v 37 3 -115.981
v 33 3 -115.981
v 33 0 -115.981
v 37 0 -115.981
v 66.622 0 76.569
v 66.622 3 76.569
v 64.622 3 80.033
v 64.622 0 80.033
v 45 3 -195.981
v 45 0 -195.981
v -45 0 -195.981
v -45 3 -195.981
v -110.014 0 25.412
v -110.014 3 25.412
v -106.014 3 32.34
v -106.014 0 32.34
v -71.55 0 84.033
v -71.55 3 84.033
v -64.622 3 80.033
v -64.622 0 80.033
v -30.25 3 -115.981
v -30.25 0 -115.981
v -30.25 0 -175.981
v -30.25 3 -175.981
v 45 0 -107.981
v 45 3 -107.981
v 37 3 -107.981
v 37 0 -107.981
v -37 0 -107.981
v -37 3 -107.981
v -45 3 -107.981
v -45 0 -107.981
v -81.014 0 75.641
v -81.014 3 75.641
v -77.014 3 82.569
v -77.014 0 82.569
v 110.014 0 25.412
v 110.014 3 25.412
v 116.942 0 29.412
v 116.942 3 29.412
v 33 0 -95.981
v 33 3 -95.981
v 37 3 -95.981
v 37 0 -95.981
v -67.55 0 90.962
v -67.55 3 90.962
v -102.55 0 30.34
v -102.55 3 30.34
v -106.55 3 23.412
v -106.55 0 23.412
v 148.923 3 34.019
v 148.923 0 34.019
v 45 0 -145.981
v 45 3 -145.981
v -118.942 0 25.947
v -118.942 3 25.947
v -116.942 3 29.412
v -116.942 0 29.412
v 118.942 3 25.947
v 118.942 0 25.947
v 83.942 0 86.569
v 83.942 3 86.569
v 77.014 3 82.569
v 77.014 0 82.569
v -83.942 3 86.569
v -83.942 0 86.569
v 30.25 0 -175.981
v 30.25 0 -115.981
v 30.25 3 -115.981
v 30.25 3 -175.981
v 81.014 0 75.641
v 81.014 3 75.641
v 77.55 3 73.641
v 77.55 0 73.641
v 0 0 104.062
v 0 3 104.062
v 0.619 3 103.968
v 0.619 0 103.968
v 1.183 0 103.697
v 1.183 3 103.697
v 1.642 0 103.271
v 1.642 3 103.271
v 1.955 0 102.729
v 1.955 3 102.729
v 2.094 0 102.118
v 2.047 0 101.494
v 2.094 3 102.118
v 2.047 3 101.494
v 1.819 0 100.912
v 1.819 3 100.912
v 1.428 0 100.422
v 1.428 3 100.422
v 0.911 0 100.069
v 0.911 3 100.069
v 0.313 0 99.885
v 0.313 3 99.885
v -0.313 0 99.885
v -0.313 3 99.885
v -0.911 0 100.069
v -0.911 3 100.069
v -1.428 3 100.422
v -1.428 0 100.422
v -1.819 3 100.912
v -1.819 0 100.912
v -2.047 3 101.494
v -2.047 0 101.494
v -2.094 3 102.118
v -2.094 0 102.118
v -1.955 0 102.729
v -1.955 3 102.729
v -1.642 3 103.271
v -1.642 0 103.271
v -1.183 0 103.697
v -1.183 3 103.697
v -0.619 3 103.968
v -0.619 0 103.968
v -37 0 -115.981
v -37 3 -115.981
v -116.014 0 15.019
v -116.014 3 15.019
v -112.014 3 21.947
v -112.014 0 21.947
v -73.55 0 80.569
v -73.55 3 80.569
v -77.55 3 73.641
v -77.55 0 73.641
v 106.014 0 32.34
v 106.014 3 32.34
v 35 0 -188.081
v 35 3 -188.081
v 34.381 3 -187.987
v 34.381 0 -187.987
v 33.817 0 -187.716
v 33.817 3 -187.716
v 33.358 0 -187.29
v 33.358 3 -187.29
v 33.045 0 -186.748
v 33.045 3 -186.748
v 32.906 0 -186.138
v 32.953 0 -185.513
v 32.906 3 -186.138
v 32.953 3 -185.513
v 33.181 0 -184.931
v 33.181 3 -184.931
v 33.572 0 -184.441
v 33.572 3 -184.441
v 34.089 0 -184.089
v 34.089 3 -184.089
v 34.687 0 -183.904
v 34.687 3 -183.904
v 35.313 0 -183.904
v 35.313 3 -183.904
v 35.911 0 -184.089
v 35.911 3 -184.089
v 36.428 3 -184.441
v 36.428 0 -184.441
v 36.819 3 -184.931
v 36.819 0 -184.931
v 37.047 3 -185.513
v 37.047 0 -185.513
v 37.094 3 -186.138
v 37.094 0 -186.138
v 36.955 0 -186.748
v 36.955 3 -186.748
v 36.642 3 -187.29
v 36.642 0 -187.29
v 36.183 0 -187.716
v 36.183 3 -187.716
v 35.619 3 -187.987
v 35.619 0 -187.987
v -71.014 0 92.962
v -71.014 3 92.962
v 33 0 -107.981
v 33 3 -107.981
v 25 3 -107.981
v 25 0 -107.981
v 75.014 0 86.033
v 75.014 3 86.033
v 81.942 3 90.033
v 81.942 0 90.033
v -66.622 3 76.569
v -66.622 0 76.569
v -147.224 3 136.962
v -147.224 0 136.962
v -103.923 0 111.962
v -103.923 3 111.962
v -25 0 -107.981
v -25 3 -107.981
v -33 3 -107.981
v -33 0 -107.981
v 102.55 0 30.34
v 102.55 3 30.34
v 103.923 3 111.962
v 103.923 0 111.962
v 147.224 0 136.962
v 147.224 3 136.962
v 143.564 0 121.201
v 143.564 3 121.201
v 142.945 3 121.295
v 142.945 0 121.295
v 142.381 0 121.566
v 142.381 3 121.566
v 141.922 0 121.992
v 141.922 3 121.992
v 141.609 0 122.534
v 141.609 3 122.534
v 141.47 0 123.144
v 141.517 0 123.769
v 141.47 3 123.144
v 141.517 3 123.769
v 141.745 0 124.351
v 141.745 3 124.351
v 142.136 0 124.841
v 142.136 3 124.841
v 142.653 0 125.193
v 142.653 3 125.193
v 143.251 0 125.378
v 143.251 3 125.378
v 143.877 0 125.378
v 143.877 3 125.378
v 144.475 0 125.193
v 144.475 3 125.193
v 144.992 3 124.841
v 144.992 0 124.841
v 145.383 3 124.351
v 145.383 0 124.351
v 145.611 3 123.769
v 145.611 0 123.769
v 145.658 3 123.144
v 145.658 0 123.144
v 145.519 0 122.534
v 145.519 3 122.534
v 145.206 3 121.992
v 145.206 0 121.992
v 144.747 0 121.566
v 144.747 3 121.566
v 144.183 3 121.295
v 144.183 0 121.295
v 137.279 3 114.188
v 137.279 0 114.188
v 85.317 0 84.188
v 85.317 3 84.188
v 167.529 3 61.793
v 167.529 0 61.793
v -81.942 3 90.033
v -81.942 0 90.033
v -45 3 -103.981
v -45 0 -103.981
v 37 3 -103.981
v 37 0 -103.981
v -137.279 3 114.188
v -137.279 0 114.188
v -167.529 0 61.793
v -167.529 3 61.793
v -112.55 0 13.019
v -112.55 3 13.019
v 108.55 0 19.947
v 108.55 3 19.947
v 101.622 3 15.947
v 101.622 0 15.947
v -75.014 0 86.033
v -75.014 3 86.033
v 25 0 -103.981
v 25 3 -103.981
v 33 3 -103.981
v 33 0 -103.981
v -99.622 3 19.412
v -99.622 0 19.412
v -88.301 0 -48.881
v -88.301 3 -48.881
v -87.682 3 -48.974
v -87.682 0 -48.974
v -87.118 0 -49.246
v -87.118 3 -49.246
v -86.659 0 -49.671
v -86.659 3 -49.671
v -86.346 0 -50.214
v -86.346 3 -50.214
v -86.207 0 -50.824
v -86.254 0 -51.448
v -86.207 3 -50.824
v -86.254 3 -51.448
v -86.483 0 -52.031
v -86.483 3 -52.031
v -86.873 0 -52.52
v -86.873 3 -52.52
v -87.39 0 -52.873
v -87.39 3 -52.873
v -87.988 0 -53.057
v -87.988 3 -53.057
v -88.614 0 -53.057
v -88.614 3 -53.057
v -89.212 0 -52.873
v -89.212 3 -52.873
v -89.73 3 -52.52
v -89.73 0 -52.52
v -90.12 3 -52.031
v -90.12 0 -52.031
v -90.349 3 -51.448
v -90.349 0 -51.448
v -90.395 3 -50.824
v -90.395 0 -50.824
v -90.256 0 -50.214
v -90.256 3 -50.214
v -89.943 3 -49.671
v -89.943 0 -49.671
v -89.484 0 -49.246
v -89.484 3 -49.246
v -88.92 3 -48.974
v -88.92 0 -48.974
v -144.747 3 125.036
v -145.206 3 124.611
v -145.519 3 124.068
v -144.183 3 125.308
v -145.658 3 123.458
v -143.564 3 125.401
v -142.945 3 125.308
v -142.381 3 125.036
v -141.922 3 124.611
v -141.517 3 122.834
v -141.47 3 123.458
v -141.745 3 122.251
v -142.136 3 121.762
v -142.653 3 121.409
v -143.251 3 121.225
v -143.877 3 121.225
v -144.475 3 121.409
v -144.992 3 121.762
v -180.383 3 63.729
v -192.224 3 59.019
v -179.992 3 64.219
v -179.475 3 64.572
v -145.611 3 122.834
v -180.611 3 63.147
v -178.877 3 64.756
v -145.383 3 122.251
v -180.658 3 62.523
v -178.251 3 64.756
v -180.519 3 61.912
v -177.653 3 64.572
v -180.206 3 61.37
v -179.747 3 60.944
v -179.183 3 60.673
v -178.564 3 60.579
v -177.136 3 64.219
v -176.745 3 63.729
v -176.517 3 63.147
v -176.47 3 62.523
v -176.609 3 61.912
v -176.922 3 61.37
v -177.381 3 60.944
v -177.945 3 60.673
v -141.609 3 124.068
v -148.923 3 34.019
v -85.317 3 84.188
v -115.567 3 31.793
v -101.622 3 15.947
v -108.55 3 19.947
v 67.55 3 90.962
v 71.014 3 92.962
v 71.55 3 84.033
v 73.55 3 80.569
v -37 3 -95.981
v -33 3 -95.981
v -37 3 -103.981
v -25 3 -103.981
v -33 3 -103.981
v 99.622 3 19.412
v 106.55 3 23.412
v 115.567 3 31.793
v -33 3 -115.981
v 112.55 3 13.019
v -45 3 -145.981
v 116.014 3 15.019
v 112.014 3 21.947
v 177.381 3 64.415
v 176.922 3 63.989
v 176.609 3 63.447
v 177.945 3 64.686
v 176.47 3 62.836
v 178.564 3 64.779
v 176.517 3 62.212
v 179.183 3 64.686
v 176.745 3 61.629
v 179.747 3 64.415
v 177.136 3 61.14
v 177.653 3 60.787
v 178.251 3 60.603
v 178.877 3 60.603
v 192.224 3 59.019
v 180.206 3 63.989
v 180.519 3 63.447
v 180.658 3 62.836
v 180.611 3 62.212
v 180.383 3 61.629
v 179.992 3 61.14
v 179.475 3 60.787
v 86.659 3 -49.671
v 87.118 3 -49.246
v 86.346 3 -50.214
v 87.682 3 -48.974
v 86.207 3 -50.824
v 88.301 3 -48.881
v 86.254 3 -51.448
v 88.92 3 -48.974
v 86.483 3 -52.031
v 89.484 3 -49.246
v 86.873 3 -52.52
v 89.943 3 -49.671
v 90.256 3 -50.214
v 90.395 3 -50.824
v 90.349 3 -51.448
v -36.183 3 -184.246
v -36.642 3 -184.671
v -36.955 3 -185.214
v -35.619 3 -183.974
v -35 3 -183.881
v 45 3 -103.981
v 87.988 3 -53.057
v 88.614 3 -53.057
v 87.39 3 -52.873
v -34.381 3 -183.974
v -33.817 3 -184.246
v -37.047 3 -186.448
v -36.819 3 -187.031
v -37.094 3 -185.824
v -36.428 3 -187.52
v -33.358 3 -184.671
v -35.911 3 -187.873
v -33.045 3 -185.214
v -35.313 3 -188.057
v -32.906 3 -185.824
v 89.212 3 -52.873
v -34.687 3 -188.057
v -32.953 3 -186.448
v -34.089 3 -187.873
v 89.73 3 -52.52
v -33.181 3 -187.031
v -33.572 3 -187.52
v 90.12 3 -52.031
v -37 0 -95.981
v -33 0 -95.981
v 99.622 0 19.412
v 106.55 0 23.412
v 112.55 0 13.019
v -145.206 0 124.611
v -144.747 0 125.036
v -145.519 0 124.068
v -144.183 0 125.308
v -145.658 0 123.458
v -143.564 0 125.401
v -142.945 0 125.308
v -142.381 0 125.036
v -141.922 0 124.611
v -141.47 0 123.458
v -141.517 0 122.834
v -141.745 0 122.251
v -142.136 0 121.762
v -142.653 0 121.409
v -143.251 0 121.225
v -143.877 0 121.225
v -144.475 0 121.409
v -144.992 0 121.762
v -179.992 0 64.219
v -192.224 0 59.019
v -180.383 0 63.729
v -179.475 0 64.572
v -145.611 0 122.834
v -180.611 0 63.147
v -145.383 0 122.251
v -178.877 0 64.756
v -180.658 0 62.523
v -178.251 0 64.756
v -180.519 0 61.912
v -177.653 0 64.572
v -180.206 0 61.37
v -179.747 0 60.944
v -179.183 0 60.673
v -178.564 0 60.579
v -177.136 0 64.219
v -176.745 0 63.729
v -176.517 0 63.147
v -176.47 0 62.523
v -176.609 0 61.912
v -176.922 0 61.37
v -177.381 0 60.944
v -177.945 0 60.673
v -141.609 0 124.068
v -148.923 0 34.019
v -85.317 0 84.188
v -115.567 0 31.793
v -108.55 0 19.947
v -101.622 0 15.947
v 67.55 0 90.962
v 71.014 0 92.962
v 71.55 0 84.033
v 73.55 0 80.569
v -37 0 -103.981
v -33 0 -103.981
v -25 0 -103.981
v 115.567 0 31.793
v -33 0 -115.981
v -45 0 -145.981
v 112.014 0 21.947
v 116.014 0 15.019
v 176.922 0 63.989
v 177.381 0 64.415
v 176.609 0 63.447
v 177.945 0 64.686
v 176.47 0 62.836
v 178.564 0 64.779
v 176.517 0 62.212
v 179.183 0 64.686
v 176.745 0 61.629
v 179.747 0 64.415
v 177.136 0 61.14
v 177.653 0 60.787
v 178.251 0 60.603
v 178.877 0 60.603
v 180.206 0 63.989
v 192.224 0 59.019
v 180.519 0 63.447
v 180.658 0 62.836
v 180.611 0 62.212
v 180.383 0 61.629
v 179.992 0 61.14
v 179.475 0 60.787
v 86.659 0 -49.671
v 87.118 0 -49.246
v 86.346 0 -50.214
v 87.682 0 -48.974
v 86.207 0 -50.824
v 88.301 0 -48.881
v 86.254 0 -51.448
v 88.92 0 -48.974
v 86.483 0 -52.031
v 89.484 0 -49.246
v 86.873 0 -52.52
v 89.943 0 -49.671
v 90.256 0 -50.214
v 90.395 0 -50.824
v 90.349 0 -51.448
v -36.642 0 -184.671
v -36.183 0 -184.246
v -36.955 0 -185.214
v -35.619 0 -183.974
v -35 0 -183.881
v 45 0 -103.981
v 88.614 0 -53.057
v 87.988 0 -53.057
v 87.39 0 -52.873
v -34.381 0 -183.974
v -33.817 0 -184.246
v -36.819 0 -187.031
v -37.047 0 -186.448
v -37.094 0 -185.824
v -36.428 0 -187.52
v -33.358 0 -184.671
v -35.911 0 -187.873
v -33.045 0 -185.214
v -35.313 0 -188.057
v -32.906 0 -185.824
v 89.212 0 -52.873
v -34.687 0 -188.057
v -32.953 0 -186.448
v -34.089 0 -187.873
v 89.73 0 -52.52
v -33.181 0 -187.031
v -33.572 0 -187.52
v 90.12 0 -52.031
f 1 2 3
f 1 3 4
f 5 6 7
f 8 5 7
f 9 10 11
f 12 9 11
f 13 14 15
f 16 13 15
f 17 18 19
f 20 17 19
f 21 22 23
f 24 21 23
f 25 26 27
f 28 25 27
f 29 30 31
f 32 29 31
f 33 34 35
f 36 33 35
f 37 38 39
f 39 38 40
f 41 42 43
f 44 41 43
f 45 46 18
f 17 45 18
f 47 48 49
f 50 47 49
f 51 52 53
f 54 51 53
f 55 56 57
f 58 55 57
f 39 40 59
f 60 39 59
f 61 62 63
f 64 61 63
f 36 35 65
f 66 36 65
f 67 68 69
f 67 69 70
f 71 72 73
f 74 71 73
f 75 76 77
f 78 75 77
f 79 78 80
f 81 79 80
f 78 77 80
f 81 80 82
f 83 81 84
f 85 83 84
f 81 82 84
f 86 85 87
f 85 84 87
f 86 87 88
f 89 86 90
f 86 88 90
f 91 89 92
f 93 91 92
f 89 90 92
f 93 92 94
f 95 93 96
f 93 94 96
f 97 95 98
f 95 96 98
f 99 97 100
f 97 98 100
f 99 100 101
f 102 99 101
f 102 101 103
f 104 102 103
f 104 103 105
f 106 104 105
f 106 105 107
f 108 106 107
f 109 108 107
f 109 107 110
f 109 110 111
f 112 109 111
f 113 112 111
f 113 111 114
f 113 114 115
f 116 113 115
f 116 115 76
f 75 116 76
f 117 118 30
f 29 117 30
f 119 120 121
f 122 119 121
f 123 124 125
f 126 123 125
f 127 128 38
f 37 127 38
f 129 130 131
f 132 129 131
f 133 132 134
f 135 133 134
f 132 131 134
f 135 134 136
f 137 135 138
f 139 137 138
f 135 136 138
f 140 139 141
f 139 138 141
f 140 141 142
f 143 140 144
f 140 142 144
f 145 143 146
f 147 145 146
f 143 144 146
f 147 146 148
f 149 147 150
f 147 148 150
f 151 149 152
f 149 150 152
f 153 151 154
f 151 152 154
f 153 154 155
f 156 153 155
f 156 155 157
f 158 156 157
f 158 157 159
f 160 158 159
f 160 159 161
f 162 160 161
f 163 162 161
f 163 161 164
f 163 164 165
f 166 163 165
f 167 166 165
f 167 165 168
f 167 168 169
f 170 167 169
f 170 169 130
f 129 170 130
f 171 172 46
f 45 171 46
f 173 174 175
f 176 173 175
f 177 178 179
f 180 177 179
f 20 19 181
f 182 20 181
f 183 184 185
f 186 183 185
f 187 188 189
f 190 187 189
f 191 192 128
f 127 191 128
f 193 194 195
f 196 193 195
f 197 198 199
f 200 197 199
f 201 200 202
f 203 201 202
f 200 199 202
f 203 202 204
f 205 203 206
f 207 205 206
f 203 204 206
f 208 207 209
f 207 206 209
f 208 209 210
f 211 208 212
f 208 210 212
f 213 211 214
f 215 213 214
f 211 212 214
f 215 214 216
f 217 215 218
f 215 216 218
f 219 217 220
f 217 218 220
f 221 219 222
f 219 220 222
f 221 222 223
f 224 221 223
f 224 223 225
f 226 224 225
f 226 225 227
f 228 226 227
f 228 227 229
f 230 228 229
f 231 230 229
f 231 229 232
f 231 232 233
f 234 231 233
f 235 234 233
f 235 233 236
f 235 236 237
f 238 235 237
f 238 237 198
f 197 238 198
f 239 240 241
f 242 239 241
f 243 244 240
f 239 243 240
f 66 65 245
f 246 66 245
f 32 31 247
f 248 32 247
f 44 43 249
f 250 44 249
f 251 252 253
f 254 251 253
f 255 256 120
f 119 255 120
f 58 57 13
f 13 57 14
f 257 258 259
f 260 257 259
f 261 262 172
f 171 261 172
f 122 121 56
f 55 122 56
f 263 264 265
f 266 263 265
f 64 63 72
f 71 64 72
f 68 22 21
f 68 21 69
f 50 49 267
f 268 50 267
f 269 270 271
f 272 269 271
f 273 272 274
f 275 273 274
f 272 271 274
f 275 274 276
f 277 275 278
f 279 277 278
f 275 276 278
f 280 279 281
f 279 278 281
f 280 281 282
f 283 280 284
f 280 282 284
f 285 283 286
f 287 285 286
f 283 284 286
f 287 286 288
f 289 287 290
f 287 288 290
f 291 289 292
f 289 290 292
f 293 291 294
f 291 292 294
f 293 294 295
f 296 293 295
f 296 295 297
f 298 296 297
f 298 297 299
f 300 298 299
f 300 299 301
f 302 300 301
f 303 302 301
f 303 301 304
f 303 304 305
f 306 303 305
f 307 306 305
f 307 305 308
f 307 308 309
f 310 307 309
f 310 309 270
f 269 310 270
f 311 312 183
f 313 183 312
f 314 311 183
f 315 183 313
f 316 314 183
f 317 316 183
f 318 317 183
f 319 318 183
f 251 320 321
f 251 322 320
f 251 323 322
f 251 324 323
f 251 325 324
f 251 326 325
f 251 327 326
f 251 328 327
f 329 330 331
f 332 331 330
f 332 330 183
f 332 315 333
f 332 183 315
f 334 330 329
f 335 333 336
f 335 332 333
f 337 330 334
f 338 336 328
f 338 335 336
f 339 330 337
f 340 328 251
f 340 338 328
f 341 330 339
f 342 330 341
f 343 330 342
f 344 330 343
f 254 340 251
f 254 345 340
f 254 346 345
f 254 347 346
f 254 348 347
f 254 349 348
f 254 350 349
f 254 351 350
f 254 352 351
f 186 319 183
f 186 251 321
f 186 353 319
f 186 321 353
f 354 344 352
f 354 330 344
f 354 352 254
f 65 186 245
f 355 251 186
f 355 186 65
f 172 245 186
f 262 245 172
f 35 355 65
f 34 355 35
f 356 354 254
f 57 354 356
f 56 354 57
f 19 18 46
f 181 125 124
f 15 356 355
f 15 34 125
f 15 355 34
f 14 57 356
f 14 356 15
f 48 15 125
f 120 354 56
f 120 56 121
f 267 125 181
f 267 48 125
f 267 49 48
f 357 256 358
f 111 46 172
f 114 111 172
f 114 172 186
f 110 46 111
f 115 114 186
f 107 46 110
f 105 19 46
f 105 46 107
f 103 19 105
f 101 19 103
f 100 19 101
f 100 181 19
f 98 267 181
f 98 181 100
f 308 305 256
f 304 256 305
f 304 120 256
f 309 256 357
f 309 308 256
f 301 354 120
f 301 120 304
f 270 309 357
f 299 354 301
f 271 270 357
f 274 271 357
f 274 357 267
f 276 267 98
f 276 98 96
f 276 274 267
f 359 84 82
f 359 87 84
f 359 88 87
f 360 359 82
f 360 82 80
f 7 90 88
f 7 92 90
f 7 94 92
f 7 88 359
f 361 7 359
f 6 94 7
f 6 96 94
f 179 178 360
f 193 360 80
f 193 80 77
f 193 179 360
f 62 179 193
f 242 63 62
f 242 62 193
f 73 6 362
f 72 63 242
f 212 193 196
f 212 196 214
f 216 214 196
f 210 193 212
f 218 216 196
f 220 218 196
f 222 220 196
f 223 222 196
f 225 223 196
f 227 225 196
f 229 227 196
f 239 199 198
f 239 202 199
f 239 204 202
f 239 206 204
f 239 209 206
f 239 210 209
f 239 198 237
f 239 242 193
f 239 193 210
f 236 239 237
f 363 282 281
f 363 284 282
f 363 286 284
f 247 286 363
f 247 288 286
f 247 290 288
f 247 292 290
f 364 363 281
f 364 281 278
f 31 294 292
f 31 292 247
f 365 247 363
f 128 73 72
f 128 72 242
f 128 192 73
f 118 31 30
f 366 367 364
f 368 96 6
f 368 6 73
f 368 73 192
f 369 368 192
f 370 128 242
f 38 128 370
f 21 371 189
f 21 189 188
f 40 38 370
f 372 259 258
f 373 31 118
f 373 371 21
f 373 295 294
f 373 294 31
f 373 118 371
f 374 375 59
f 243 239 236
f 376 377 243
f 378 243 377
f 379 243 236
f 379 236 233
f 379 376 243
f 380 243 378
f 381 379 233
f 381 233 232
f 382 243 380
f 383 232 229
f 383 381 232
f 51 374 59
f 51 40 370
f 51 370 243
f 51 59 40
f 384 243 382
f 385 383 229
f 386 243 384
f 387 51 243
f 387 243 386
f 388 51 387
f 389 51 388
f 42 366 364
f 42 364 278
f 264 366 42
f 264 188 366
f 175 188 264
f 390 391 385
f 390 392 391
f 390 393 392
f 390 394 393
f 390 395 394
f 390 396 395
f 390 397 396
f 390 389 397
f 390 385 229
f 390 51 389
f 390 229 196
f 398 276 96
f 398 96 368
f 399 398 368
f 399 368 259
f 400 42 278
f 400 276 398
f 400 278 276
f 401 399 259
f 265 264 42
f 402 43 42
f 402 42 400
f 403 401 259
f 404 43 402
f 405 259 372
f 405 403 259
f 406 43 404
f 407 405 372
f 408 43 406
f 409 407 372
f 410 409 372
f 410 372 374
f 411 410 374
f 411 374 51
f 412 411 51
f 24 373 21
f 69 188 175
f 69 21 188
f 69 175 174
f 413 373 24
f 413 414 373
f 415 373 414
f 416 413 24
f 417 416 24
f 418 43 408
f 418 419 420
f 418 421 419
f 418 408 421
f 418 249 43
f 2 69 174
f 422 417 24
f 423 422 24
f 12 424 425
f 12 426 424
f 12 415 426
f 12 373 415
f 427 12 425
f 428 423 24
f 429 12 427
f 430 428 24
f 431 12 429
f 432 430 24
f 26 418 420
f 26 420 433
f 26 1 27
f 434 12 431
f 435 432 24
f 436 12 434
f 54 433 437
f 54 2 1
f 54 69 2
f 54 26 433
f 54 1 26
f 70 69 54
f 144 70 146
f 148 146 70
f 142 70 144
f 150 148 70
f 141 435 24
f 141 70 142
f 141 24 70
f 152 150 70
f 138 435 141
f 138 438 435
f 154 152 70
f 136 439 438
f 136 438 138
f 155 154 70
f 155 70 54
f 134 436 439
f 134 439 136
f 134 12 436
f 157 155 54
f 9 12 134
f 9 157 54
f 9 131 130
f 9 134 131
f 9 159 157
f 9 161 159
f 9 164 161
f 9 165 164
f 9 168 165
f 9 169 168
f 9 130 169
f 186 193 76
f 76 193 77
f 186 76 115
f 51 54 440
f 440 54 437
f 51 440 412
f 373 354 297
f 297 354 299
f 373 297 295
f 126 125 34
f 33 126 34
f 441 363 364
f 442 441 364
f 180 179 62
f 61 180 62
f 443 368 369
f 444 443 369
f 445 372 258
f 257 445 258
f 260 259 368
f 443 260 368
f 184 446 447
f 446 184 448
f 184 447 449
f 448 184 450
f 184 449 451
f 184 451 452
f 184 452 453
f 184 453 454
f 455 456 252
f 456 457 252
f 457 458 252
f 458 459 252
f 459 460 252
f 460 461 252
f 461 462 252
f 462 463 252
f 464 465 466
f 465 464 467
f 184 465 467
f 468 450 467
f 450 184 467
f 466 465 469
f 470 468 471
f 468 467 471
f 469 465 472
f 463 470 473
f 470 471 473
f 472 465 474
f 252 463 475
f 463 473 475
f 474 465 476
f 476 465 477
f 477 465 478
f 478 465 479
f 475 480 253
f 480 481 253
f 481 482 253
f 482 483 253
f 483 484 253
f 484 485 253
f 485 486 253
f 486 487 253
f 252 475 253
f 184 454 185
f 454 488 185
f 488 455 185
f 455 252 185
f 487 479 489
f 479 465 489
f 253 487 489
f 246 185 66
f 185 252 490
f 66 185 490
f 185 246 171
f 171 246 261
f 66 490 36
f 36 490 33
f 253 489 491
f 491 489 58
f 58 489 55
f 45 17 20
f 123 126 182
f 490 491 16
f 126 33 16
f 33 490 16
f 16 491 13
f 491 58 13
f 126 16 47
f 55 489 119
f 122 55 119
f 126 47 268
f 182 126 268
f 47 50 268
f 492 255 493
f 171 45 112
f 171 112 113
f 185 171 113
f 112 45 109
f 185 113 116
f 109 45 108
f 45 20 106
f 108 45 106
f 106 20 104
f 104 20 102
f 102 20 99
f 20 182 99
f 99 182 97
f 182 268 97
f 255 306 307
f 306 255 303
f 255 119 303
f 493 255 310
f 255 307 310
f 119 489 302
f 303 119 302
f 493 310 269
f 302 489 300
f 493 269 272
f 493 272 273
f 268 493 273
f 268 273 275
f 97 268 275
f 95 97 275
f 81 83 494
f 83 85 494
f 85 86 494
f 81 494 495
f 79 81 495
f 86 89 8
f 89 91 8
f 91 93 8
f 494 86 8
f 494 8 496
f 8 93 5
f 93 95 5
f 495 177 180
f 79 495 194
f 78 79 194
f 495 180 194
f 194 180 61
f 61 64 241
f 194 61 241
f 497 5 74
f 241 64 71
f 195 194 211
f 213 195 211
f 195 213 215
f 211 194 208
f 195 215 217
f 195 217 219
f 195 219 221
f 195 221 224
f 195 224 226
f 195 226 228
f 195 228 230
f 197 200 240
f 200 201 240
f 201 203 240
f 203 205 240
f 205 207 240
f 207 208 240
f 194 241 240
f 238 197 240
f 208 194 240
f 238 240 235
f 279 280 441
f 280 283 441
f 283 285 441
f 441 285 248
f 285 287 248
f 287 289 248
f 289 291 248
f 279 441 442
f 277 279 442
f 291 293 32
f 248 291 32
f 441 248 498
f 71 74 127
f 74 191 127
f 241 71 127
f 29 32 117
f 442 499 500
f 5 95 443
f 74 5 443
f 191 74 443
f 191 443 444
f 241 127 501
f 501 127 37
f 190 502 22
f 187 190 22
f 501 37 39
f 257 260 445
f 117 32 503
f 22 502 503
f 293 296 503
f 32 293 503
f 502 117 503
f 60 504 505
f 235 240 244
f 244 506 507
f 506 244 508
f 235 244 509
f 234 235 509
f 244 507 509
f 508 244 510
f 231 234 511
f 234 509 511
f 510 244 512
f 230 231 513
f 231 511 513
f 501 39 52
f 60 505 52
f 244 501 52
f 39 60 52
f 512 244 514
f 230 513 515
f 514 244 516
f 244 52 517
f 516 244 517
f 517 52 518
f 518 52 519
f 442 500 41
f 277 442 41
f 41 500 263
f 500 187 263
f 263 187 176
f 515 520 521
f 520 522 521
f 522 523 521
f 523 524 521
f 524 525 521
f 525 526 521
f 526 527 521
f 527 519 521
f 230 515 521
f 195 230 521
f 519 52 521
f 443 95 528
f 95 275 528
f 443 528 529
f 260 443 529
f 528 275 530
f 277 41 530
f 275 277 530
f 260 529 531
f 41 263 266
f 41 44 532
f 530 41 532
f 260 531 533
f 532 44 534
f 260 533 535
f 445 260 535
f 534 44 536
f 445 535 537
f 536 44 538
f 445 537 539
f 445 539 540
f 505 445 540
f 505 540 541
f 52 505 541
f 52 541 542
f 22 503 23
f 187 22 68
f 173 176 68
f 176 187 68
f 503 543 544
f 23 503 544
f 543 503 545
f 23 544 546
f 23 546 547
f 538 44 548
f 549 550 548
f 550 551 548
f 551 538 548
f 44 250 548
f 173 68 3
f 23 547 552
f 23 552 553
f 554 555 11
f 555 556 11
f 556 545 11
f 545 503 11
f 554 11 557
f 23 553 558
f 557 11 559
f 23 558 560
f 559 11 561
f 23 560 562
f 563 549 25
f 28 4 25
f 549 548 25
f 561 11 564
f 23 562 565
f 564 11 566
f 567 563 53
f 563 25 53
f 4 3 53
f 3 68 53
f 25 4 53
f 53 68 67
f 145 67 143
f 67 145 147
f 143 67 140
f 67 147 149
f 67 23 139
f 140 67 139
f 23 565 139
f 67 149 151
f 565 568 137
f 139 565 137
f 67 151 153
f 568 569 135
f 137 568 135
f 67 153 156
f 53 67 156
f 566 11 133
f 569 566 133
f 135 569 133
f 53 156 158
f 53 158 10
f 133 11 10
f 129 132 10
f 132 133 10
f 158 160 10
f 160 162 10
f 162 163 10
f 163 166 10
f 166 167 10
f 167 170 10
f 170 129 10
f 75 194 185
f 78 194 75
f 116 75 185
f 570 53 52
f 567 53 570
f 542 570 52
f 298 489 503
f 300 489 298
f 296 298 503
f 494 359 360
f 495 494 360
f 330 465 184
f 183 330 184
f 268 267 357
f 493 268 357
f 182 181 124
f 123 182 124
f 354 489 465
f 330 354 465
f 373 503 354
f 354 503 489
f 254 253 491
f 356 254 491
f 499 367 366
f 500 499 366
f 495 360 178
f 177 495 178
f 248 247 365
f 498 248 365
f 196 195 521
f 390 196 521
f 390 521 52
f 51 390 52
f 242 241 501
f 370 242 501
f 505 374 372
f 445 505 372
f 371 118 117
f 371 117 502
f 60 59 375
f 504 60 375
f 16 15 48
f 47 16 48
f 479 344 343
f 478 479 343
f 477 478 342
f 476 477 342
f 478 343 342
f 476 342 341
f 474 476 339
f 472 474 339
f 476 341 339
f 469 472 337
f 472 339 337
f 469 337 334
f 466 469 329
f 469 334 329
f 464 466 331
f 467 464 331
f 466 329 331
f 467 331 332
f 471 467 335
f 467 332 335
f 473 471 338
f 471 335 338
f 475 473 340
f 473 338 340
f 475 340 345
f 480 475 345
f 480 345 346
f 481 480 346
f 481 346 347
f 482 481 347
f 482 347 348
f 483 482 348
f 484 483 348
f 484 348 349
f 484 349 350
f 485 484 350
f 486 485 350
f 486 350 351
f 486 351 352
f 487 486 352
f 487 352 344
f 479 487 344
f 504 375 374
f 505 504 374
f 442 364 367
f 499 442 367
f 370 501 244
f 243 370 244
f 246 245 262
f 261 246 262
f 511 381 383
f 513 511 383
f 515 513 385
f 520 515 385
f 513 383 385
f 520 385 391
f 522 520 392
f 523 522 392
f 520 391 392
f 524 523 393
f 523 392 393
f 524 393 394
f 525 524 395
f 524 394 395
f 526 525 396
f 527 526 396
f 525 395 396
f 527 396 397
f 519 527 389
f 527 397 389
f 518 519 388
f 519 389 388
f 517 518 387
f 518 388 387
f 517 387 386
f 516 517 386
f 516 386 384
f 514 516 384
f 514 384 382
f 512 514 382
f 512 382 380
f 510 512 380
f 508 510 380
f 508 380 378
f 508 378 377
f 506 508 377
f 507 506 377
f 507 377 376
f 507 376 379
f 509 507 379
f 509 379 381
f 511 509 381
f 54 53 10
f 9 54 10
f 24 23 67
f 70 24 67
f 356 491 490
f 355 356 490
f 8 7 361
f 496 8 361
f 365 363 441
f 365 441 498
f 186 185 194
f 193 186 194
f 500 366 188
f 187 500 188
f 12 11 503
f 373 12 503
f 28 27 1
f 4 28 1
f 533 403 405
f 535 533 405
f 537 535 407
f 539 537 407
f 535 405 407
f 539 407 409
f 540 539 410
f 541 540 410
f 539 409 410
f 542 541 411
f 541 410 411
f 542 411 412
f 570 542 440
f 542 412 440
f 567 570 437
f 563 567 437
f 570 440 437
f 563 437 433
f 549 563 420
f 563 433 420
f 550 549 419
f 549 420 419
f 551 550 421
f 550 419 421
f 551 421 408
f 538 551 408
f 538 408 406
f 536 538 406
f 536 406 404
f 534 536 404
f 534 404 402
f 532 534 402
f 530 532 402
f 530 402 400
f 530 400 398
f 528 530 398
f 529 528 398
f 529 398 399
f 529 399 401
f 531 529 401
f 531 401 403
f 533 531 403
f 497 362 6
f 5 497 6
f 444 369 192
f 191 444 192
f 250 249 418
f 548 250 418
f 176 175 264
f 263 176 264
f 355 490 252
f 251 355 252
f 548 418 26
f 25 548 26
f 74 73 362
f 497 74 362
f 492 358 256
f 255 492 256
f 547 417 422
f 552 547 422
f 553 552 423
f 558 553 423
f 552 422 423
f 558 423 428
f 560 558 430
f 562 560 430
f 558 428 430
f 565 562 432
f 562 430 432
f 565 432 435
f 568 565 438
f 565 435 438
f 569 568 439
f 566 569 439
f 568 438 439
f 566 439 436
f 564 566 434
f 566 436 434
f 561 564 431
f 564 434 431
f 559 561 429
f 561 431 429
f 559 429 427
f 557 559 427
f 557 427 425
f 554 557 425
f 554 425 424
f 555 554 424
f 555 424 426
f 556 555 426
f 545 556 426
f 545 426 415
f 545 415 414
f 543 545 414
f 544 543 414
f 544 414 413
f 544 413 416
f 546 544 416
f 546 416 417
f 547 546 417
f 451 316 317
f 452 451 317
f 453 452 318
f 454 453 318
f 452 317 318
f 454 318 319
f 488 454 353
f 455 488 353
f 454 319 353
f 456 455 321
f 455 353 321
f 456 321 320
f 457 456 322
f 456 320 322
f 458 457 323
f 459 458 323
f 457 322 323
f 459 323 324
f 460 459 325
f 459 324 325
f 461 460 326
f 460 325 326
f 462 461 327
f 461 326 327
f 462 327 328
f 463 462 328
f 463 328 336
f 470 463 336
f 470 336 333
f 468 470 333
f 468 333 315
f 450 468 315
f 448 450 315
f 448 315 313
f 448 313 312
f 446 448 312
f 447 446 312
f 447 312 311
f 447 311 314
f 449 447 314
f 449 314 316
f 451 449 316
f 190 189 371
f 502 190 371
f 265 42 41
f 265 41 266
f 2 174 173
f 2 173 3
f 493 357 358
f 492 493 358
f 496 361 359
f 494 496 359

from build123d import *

# Parameters (mm, degrees)
ESQUISSE1_W             = 60.5
ESQUISSE1_H             = 60
BOSS_EXTRU_1_DEPTH      = 3
ESQUISSE2_R             = 2.1
ENL_V_MAT_EXTRU_1_DEPTH = 275.531688146
ESQUISSE6_W             = 4
ESQUISSE6_H             = 8
ENL_V_MAT_EXTRU_2_DEPTH = 275.531688146


with BuildPart() as part:
    # Esquisse1 → Boss.-Extru.1 (new body)
    with BuildSketch(Plane(origin=(0, 0, 0), x_dir=(1, 0, 0), z_dir=(0, 1, 0))):
        Polygon((-147.224318643, -136.961524227), (-103.923048454, -111.961524227), (103.923048454, -111.961524227), (147.224318643, -136.961524227), (192.224318643, -59.019237886), (148.923048454, -34.019237886), (45, 145.980762114), (45, 195.980762114), (-45, 195.980762114), (-45, 145.980762114), (-148.923048454, -34.019237886), (-192.224318643, -59.019237886), align=None)
        Polygon((-137.278810568, -114.187649521), (-167.528810568, -61.793112592), (-115.567286341, -31.793112592), (-85.317286341, -84.187649521), align=None, mode=Mode.SUBTRACT)
        Polygon((167.528810568, -61.793112592), (137.278810568, -114.187649521), (85.317286341, -84.187649521), (115.567286341, -31.793112592), align=None, mode=Mode.SUBTRACT)
        with Locations((0, 145.980762114)):
            Rectangle(ESQUISSE1_W, ESQUISSE1_H, mode=Mode.SUBTRACT)
    extrude(amount=BOSS_EXTRU_1_DEPTH)

    # Esquisse2 → Enlèv. mat.-Extru.1 (cut, through all)
    with BuildSketch(Plane(origin=(0, 3, 0), x_dir=(1, 0, 0), z_dir=(0, 1, 0))):
        with Locations(Location((-35, 185.980762114, 0), (0, 0, 270))):
            Circle(ESQUISSE2_R)
        with Locations(Location((35, 185.980762114, 0), (0, 0, 90))):
            Circle(ESQUISSE2_R)
        with Locations(Location((-143.564064605, -123.301270189, 0), (0, 0, 270))):
            Circle(ESQUISSE2_R)
        with Locations(Location((-178.564064605, -62.679491924, 0), (0, 0, 90))):
            Circle(ESQUISSE2_R)
        with Locations(Location((178.564064606, -62.679491924, 0), (0, 0, 270))):
            Circle(ESQUISSE2_R)
        with Locations(Location((143.564064606, -123.301270189, 0), (0, 0, 90))):
            Circle(ESQUISSE2_R)
        with Locations(Location((88.301270189, 50.980762114, 0), (0, 0, 270))):
            Circle(ESQUISSE2_R)
        with Locations(Location((0, -101.961524227, 0), (0, 0, 270))):
            Circle(ESQUISSE2_R)
        with Locations(Location((-88.301270189, 50.980762114, 0), (0, 0, 270))):
            Circle(ESQUISSE2_R)
    extrude(amount=-ENL_V_MAT_EXTRU_1_DEPTH, mode=Mode.SUBTRACT)

    # Esquisse6 → Enlèv. mat.-Extru.2 (cut, through all)
    with BuildSketch(Plane(origin=(0, 3, 0), x_dir=(1, 0, 0), z_dir=(0, 1, 0))):
        with Locations((-35, 111.980762114)):
            Rectangle(ESQUISSE6_W, ESQUISSE6_H)
        Polygon((-37, 105.980762114), (-37, 103.980762114), (-33, 103.980762114), (-33, 105.980762114), (-33, 107.980762114), (-37, 107.980762114), align=None)
        Polygon((-45, 107.980762114), (-45, 103.980762114), (-37, 103.980762114), (-37, 105.980762114), (-37, 107.980762114), align=None)
        Polygon((-33, 105.980762114), (-33, 103.980762114), (-25, 103.980762114), (-25, 107.980762114), (-33, 107.980762114), align=None)
        with Locations((-35, 99.980762114)):
            Rectangle(ESQUISSE6_W, ESQUISSE6_H)
        Polygon((33, 105.980762114), (33, 107.980762114), (25, 107.980762114), (25, 103.980762114), (33, 103.980762114), align=None)
        with Locations((35, 111.980762114)):
            Rectangle(ESQUISSE6_W, ESQUISSE6_H)
        Polygon((37, 105.980762114), (37, 107.980762114), (33, 107.980762114), (33, 105.980762114), (33, 103.980762114), (37, 103.980762114), align=None)
        Polygon((45, 103.980762114), (45, 107.980762114), (37, 107.980762114), (37, 105.980762114), (37, 103.980762114), align=None)
        with Locations((35, 99.980762114)):
            Rectangle(ESQUISSE6_W, ESQUISSE6_H)
        Polygon((116.01408311, -15.019237886), (112.549981495, -13.019237886), (108.549981495, -19.947441117), (110.282032303, -20.947441117), (112.01408311, -21.947441117), align=None)
        Polygon((110.282032303, -20.947441117), (108.549981495, -19.947441117), (106.549981495, -23.411542732), (108.282032303, -24.411542732), (110.01408311, -25.411542732), (112.01408311, -21.947441117), align=None)
        Polygon((108.549981495, -19.947441117), (101.621778265, -15.947441117), (99.621778265, -19.411542732), (106.549981495, -23.411542732), align=None)
        Polygon((108.282032303, -24.411542732), (106.549981495, -23.411542732), (102.549981495, -30.339745962), (106.01408311, -32.339745962), (110.01408311, -25.411542732), align=None)
        Polygon((118.942286341, -25.947441117), (112.01408311, -21.947441117), (110.01408311, -25.411542732), (116.942286341, -29.411542732), align=None)
        Polygon((64.621778265, -80.033320997), (71.549981495, -84.033320997), (73.549981495, -80.569219382), (66.621778265, -76.569219382), align=None)
        Polygon((75.282032303, -81.569219382), (77.01408311, -82.569219382), (81.01408311, -75.641016151), (77.549981495, -73.641016151), (73.549981495, -80.569219382), align=None)
        Polygon((73.282032303, -85.033320997), (75.01408311, -86.033320997), (77.01408311, -82.569219382), (75.282032303, -81.569219382), (73.549981495, -80.569219382), (71.549981495, -84.033320997), align=None)
        Polygon((77.01408311, -82.569219382), (75.01408311, -86.033320997), (81.942286341, -90.033320997), (83.942286341, -86.569219382), align=None)
        Polygon((67.549981495, -90.961524227), (71.01408311, -92.961524227), (75.01408311, -86.033320997), (73.282032303, -85.033320997), (71.549981495, -84.033320997), align=None)
        Polygon((-75.282032303, -81.569219382), (-73.549981495, -80.569219382), (-77.549981495, -73.641016151), (-81.01408311, -75.641016151), (-77.01408311, -82.569219382), align=None)
        Polygon((-81.942286341, -90.033320997), (-75.01408311, -86.033320997), (-77.01408311, -82.569219382), (-83.942286341, -86.569219382), align=None)
        Polygon((-71.01408311, -92.961524227), (-67.549981495, -90.961524227), (-71.549981495, -84.033320997), (-73.282032303, -85.033320997), (-75.01408311, -86.033320997), align=None)
        Polygon((-71.549981495, -84.033320997), (-64.621778265, -80.033320997), (-66.621778265, -76.569219382), (-73.549981495, -80.569219382), align=None)
        Polygon((-110.01408311, -25.411542732), (-112.01408311, -21.947441117), (-118.942286341, -25.947441117), (-116.942286341, -29.411542732), align=None)
        Polygon((-112.549981495, -13.019237886), (-116.01408311, -15.019237886), (-112.01408311, -21.947441117), (-110.282032303, -20.947441117), (-108.549981495, -19.947441117), align=None)
        Polygon((-110.282032303, -20.947441117), (-112.01408311, -21.947441117), (-110.01408311, -25.411542732), (-108.282032303, -24.411542732), (-106.549981495, -23.411542732), (-108.549981495, -19.947441117), align=None)
        Polygon((-101.621778265, -15.947441117), (-108.549981495, -19.947441117), (-106.549981495, -23.411542732), (-99.621778265, -19.411542732), align=None)
        Polygon((-108.282032303, -24.411542732), (-110.01408311, -25.411542732), (-106.01408311, -32.339745962), (-102.549981495, -30.339745962), (-106.549981495, -23.411542732), align=None)
        Polygon((-73.282032303, -85.033320997), (-71.549981495, -84.033320997), (-73.549981495, -80.569219382), (-75.282032303, -81.569219382), (-77.01408311, -82.569219382), (-75.01408311, -86.033320997), align=None)
    extrude(amount=-ENL_V_MAT_EXTRU_2_DEPTH, mode=Mode.SUBTRACT)


solid = part.part
